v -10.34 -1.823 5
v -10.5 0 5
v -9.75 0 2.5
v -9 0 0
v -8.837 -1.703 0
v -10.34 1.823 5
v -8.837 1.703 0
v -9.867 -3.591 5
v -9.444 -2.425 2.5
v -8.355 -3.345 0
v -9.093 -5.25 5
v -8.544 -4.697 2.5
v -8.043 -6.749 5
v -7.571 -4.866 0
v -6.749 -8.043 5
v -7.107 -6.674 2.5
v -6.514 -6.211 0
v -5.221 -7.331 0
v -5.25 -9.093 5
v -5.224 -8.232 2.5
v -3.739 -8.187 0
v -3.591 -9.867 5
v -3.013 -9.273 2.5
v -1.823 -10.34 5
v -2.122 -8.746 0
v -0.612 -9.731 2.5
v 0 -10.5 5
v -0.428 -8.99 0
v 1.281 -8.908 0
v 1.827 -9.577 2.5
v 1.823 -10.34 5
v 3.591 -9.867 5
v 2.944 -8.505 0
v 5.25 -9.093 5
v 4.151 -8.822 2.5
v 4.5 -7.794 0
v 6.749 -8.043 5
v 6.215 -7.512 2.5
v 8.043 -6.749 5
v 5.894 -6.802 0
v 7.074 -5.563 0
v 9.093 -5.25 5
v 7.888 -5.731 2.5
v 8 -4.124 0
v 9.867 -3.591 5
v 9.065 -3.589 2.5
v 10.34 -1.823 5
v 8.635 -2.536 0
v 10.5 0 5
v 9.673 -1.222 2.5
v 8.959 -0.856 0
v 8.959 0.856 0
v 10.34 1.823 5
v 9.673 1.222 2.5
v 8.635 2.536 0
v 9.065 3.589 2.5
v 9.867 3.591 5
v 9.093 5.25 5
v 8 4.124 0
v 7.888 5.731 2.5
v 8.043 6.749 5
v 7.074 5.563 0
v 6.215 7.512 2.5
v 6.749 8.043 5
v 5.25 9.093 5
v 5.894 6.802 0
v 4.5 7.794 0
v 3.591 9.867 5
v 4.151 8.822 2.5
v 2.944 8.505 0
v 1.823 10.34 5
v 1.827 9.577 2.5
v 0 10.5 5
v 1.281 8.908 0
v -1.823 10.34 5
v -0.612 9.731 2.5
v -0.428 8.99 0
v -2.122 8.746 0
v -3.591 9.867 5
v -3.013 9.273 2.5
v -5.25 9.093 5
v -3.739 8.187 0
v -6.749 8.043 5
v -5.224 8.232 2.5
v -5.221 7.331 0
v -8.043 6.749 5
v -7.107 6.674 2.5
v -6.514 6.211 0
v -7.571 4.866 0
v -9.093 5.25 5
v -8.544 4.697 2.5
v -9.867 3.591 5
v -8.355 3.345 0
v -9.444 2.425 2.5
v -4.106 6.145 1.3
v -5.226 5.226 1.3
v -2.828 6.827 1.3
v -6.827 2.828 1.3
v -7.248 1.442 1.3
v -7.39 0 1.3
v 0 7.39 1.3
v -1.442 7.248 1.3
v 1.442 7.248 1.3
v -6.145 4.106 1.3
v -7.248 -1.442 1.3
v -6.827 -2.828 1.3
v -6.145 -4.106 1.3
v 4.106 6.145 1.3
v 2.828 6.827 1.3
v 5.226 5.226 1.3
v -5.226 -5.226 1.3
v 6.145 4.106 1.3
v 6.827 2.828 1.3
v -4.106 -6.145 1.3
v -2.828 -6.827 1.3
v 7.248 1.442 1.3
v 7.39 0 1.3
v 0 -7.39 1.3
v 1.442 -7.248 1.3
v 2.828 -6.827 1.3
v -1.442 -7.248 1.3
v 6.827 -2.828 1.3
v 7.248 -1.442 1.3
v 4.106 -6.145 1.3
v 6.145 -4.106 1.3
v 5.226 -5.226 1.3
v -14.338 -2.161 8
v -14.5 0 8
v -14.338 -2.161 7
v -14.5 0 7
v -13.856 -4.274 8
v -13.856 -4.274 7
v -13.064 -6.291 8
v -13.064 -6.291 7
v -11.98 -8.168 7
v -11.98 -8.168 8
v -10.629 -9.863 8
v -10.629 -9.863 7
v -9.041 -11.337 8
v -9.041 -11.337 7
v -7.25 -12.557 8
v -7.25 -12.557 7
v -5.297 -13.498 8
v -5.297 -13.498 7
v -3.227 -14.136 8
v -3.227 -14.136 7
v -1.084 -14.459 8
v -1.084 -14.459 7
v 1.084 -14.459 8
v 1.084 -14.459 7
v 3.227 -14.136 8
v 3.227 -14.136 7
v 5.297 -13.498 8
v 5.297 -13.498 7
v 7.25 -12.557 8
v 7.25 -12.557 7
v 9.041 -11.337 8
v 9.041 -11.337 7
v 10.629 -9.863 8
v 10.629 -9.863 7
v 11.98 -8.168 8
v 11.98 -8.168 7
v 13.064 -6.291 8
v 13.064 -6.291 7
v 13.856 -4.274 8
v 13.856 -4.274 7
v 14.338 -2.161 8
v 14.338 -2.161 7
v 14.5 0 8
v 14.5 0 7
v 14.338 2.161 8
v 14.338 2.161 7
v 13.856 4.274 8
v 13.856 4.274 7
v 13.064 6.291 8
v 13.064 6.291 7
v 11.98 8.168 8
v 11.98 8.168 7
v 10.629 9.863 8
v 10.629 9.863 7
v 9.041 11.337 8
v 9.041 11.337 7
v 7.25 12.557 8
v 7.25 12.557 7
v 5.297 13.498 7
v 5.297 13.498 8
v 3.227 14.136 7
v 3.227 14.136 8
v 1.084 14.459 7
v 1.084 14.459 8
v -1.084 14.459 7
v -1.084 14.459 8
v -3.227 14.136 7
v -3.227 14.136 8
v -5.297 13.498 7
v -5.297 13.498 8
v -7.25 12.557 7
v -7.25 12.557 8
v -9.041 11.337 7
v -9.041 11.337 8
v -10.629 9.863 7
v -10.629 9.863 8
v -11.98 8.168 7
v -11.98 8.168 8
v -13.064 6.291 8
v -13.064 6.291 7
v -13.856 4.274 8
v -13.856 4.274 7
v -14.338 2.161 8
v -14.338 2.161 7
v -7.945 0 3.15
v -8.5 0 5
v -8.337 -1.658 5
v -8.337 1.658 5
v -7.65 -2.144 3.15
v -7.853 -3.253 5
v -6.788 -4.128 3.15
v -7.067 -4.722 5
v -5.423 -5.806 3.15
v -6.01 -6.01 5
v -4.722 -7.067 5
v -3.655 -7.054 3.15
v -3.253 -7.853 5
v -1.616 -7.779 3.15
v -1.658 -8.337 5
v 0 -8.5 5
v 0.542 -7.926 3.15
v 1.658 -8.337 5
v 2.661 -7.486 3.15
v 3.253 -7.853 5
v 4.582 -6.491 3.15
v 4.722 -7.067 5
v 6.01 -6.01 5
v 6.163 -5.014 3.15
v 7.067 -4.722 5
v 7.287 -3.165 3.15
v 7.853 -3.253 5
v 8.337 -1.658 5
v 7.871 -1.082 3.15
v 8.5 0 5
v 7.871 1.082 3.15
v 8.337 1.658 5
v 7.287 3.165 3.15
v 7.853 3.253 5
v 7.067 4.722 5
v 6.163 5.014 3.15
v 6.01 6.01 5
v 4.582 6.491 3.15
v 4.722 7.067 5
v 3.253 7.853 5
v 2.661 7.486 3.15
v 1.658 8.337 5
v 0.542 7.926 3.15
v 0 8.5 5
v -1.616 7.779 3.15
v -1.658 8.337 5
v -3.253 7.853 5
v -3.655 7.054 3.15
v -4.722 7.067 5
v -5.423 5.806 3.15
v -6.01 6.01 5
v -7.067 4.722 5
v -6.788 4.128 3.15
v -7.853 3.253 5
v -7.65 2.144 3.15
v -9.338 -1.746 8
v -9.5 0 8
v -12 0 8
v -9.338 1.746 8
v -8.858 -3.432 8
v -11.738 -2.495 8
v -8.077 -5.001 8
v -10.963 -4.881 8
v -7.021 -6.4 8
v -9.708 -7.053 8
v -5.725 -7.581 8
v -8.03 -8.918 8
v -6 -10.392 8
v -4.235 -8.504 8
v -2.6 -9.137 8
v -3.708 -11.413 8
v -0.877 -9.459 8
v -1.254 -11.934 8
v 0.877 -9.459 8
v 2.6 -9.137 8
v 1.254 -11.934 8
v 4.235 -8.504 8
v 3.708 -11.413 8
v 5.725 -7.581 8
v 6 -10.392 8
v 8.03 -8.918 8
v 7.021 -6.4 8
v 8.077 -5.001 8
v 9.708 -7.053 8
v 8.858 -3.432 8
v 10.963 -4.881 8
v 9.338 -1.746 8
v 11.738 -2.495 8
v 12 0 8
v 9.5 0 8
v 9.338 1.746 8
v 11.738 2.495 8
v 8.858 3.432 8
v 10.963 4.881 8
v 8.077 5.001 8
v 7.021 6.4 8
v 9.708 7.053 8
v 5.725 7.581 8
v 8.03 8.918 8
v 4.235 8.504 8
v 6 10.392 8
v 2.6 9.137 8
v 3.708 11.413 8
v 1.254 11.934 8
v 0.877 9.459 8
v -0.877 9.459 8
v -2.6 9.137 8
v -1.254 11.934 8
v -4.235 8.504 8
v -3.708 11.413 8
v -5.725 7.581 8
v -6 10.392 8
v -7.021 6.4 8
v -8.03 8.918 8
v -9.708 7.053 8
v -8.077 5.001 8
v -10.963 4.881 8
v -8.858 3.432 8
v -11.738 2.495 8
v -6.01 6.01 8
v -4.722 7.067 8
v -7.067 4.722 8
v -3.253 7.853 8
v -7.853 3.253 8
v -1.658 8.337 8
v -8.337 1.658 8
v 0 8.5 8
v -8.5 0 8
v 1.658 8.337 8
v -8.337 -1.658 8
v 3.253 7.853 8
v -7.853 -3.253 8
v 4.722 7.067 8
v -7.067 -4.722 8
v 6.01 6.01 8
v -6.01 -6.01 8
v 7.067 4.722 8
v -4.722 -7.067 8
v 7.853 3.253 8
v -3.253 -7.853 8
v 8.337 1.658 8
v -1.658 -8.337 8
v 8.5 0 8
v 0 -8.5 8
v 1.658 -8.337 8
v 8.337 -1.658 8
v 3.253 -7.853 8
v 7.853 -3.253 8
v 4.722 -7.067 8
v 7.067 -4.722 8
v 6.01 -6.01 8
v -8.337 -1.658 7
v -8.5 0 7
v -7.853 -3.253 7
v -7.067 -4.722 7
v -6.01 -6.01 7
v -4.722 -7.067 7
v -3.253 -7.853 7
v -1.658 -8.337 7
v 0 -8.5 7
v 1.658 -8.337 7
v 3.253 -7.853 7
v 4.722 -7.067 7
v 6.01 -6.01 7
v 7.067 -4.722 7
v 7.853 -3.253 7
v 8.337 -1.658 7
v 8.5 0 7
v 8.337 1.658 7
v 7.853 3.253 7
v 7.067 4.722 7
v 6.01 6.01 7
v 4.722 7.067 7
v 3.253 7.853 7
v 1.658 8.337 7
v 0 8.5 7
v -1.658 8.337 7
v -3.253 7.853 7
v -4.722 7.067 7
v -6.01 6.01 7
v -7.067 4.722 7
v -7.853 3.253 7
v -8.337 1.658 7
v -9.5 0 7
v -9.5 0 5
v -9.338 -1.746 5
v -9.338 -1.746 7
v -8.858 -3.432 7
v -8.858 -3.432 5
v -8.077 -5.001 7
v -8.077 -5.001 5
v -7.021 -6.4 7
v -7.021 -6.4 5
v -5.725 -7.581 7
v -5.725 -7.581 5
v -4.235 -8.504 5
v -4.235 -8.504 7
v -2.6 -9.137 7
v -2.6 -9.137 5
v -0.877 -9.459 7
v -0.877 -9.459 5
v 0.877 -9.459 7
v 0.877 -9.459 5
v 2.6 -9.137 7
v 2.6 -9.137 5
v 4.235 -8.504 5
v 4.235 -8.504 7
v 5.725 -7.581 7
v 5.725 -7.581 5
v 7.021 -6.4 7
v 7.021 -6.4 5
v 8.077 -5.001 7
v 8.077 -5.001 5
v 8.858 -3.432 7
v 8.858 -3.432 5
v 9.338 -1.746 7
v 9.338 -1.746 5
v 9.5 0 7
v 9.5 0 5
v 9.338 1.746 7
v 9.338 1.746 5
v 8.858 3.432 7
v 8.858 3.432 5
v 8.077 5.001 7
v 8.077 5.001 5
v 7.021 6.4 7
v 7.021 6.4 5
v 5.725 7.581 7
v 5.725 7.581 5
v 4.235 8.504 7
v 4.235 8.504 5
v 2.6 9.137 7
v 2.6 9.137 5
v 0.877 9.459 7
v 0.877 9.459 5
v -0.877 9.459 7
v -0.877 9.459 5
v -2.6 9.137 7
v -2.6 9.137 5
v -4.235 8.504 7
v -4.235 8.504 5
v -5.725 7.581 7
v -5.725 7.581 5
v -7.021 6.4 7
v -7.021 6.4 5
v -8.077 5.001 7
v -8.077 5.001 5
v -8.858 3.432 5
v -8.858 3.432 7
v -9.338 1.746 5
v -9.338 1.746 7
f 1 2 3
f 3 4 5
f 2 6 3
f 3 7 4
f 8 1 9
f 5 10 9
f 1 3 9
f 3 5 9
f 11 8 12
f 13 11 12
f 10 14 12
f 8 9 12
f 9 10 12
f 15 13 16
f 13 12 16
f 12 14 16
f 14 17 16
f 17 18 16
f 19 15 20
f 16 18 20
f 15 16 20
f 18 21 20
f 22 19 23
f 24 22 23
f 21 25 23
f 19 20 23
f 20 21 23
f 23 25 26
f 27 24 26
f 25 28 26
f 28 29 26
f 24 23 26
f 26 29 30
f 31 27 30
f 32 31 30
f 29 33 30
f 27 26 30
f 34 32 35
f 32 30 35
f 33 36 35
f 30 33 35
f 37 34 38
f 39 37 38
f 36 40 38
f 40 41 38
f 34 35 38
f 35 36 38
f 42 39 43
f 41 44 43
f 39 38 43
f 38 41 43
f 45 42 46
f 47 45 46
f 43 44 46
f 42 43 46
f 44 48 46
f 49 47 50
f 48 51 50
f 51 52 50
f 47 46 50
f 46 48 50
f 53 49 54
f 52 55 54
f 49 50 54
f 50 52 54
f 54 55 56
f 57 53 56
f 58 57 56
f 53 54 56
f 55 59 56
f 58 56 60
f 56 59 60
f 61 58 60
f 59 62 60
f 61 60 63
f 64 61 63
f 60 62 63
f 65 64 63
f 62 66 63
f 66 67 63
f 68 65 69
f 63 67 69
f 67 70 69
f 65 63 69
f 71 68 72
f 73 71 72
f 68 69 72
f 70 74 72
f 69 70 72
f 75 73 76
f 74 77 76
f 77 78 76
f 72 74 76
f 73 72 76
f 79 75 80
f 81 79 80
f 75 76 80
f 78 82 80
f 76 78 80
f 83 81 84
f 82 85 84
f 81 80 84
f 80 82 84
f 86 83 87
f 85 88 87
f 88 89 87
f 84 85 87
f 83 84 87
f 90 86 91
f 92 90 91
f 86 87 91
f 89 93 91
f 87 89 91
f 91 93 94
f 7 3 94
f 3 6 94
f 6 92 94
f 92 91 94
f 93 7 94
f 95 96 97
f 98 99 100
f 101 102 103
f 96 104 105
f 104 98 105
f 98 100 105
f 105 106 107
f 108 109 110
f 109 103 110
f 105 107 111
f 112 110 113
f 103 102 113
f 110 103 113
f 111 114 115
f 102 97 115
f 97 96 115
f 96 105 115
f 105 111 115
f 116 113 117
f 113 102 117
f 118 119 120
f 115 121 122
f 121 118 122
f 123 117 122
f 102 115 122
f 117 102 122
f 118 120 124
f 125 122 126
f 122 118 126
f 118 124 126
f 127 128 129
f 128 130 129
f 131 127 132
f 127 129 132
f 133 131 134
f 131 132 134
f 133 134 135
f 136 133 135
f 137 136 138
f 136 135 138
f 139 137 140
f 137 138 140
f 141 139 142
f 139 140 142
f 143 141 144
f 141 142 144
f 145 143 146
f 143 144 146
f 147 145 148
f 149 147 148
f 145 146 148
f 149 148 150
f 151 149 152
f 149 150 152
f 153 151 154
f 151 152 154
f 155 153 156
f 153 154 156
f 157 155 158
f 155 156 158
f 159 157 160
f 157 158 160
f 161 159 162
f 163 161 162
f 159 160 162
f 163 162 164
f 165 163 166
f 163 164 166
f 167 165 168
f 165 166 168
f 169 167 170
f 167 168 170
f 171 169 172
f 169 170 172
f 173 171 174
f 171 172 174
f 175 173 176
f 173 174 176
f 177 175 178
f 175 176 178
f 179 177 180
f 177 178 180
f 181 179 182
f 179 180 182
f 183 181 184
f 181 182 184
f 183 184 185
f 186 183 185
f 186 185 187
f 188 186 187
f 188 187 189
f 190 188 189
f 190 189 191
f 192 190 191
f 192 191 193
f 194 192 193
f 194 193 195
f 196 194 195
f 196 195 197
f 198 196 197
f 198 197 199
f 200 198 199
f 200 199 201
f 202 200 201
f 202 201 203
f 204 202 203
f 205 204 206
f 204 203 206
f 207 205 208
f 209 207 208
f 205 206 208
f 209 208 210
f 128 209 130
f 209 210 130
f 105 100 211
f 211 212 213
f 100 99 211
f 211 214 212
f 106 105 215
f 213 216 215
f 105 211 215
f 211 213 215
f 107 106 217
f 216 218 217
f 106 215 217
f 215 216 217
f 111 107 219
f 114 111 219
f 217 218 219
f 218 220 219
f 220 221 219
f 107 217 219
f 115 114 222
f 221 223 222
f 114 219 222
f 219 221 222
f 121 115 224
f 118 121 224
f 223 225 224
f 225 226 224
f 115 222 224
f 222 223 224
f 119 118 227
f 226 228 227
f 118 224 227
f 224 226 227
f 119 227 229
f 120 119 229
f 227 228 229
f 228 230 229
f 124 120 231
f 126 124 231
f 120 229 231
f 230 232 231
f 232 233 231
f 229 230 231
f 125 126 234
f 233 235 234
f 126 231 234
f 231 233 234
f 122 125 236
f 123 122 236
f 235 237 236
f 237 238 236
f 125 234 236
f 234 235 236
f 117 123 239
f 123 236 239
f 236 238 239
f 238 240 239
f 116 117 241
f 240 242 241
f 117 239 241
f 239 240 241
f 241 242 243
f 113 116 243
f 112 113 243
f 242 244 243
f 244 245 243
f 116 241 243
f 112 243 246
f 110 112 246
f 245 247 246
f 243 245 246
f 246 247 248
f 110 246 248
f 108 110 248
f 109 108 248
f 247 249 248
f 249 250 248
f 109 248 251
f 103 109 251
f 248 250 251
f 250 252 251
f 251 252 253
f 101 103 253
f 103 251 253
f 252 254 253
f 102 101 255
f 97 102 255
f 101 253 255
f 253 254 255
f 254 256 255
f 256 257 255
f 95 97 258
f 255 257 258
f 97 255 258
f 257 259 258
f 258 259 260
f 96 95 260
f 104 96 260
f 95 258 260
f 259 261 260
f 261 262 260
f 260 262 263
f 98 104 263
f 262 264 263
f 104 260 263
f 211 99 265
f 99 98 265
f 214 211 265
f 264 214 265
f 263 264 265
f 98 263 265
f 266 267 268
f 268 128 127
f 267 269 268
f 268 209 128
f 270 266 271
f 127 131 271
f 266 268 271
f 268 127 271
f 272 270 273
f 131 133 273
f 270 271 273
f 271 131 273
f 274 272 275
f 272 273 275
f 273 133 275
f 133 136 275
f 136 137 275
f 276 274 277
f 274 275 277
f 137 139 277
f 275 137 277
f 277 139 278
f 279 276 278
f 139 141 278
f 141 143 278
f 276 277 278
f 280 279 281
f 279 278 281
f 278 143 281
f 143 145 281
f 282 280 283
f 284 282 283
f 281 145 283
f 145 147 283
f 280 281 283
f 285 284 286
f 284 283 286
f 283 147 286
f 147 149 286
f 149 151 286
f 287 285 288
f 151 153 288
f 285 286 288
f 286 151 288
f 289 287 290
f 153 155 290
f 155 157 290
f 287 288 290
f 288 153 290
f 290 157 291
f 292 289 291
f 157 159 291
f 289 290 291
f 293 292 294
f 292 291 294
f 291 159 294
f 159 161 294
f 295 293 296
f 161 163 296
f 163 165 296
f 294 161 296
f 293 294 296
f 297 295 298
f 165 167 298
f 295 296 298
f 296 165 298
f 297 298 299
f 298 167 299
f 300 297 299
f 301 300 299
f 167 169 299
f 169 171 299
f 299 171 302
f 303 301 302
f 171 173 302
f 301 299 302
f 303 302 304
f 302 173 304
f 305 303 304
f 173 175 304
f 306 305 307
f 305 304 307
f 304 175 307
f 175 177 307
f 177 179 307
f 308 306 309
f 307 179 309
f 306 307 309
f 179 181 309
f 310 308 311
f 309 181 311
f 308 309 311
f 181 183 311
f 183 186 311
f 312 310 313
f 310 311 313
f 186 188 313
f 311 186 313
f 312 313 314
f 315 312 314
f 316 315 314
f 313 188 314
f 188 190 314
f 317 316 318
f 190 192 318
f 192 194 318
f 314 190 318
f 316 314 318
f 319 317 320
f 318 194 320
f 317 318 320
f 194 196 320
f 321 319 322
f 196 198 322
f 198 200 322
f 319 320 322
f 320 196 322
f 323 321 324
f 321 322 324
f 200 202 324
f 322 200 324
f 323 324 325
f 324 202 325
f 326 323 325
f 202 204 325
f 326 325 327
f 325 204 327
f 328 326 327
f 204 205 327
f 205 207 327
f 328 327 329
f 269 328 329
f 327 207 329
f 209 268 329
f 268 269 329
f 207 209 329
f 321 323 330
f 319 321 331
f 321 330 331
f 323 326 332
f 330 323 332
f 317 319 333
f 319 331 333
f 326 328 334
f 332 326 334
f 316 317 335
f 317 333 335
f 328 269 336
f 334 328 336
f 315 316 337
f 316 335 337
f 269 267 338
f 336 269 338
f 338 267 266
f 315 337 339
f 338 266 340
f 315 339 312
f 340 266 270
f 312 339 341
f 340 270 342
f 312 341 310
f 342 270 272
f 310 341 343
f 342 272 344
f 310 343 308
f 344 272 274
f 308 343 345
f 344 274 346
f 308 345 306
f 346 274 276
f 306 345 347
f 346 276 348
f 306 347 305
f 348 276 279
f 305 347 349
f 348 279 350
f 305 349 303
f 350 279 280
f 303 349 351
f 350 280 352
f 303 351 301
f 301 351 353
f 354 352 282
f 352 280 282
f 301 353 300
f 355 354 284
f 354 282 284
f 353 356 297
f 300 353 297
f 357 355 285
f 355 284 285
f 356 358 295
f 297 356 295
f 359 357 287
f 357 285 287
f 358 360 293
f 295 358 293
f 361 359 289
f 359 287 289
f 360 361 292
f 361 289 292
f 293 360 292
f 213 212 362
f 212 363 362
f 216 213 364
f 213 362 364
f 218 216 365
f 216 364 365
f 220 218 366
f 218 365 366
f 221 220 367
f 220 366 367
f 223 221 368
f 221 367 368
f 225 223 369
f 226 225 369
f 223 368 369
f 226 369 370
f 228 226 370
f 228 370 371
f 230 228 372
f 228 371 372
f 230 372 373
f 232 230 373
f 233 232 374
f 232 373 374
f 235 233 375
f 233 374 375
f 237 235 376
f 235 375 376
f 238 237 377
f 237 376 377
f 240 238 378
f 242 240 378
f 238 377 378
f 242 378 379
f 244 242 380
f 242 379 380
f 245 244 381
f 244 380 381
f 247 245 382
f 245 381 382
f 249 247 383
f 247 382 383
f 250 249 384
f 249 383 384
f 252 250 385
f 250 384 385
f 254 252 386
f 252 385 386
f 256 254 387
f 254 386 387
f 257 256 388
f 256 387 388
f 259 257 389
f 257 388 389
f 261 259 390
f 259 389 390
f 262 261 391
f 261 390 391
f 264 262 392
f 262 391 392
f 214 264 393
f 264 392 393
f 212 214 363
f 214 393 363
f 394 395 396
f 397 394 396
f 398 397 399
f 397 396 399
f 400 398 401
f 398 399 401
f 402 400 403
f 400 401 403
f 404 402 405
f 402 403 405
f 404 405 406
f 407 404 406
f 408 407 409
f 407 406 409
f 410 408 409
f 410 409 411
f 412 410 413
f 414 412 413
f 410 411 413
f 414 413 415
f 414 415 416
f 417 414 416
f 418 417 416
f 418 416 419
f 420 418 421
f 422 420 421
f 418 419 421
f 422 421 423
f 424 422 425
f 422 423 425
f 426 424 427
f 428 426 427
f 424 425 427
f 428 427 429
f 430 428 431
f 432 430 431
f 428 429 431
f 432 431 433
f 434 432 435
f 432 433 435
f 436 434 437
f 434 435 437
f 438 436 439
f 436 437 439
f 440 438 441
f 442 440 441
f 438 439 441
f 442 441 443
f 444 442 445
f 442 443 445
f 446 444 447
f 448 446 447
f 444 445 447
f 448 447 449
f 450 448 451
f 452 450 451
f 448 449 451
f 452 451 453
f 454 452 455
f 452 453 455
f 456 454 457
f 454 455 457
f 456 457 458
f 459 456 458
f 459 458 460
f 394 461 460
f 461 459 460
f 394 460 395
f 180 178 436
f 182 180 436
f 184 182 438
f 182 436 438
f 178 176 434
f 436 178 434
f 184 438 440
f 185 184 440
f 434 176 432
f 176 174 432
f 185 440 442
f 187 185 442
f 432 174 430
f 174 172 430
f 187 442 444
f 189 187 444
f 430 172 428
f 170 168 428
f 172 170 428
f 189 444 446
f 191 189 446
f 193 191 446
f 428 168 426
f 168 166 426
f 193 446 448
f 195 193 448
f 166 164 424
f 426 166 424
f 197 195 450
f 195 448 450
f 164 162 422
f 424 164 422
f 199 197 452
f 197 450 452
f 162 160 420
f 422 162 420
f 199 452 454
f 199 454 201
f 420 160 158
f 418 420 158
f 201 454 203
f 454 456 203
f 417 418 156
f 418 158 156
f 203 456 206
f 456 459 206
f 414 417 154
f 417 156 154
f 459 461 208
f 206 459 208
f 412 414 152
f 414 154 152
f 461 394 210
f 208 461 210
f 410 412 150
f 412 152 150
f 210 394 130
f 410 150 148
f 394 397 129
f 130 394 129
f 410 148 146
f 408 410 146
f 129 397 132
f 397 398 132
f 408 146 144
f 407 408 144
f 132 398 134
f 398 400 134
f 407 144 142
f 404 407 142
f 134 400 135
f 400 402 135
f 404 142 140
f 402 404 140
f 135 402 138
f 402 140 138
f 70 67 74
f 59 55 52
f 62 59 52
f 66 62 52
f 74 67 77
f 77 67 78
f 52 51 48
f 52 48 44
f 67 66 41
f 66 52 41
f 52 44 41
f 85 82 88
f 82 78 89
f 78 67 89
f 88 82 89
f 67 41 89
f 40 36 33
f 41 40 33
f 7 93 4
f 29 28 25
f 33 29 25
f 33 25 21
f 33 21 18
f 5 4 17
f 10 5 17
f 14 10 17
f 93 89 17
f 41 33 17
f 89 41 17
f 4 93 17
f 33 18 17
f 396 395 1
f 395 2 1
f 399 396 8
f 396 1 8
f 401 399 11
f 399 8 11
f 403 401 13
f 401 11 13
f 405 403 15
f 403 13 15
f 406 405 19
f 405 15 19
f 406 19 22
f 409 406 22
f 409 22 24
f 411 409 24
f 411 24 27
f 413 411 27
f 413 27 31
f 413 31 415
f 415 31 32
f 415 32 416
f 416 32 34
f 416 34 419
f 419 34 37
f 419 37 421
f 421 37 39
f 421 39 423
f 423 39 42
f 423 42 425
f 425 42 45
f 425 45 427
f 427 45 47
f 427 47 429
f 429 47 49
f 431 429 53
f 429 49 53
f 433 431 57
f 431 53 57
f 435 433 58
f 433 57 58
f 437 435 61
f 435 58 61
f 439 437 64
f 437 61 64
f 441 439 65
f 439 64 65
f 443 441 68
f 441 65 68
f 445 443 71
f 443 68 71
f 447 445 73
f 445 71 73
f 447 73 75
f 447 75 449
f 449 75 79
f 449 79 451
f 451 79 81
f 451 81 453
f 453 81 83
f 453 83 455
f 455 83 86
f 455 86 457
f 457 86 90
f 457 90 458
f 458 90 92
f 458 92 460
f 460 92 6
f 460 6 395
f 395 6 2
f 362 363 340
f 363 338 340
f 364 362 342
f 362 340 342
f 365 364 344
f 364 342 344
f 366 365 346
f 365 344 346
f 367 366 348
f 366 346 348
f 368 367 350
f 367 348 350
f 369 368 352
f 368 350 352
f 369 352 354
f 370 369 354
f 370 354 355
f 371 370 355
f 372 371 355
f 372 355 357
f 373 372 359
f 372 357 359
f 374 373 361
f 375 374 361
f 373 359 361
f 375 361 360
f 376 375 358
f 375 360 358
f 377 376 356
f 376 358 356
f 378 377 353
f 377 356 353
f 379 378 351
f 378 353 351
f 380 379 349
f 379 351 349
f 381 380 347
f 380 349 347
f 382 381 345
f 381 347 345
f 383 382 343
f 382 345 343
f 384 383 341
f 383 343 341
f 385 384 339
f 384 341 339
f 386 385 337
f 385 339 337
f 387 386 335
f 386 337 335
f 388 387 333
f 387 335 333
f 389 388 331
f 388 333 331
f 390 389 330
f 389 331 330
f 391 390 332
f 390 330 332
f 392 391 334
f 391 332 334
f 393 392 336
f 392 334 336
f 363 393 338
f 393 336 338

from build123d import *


# Not quite as in the source:
# - ends of sketch curves that miss each other by under 0.0002 mm in the source are joined


with BuildPart() as f1:
    # F0 (on Front) → F1 (revolve)
    with BuildSketch(Plane.XZ):
        Polygon((-7, 0), (0, 0), (0, 1.3), (-7.3899972171, 1.3), align=None)
        Polygon((-9, 0), (-7, 0), (-7.3899972171, 1.3), (-9, 1.3), align=None)
        Polygon((-10.4999892964, 4.9999928643), (-9, 0), (-9, 1.3), (-7.3899972171, 1.3), (-8.4999892965, 5), (-9.4999892964, 4.9999964322), align=None)
        Polygon((-9.4999892964, 4.9999964322), (-8.4999892965, 5), (-8.4999964322, 7), (-9.4999964321, 6.9999964322), align=None)
        Polygon((-9.4999964321, 6.9999964322), (-8.4999964322, 7), (-8.5, 8), (-9.4999964321, 8), align=None)
        Polygon((-14.5, 7), (-9.4999964321, 7), (-9.4999964321, 7.9999964322), (-14.5, 8), align=None)
    revolve(axis=Axis((0, 0, 0.65), (0, 0, 1)))


solid = f1.part
